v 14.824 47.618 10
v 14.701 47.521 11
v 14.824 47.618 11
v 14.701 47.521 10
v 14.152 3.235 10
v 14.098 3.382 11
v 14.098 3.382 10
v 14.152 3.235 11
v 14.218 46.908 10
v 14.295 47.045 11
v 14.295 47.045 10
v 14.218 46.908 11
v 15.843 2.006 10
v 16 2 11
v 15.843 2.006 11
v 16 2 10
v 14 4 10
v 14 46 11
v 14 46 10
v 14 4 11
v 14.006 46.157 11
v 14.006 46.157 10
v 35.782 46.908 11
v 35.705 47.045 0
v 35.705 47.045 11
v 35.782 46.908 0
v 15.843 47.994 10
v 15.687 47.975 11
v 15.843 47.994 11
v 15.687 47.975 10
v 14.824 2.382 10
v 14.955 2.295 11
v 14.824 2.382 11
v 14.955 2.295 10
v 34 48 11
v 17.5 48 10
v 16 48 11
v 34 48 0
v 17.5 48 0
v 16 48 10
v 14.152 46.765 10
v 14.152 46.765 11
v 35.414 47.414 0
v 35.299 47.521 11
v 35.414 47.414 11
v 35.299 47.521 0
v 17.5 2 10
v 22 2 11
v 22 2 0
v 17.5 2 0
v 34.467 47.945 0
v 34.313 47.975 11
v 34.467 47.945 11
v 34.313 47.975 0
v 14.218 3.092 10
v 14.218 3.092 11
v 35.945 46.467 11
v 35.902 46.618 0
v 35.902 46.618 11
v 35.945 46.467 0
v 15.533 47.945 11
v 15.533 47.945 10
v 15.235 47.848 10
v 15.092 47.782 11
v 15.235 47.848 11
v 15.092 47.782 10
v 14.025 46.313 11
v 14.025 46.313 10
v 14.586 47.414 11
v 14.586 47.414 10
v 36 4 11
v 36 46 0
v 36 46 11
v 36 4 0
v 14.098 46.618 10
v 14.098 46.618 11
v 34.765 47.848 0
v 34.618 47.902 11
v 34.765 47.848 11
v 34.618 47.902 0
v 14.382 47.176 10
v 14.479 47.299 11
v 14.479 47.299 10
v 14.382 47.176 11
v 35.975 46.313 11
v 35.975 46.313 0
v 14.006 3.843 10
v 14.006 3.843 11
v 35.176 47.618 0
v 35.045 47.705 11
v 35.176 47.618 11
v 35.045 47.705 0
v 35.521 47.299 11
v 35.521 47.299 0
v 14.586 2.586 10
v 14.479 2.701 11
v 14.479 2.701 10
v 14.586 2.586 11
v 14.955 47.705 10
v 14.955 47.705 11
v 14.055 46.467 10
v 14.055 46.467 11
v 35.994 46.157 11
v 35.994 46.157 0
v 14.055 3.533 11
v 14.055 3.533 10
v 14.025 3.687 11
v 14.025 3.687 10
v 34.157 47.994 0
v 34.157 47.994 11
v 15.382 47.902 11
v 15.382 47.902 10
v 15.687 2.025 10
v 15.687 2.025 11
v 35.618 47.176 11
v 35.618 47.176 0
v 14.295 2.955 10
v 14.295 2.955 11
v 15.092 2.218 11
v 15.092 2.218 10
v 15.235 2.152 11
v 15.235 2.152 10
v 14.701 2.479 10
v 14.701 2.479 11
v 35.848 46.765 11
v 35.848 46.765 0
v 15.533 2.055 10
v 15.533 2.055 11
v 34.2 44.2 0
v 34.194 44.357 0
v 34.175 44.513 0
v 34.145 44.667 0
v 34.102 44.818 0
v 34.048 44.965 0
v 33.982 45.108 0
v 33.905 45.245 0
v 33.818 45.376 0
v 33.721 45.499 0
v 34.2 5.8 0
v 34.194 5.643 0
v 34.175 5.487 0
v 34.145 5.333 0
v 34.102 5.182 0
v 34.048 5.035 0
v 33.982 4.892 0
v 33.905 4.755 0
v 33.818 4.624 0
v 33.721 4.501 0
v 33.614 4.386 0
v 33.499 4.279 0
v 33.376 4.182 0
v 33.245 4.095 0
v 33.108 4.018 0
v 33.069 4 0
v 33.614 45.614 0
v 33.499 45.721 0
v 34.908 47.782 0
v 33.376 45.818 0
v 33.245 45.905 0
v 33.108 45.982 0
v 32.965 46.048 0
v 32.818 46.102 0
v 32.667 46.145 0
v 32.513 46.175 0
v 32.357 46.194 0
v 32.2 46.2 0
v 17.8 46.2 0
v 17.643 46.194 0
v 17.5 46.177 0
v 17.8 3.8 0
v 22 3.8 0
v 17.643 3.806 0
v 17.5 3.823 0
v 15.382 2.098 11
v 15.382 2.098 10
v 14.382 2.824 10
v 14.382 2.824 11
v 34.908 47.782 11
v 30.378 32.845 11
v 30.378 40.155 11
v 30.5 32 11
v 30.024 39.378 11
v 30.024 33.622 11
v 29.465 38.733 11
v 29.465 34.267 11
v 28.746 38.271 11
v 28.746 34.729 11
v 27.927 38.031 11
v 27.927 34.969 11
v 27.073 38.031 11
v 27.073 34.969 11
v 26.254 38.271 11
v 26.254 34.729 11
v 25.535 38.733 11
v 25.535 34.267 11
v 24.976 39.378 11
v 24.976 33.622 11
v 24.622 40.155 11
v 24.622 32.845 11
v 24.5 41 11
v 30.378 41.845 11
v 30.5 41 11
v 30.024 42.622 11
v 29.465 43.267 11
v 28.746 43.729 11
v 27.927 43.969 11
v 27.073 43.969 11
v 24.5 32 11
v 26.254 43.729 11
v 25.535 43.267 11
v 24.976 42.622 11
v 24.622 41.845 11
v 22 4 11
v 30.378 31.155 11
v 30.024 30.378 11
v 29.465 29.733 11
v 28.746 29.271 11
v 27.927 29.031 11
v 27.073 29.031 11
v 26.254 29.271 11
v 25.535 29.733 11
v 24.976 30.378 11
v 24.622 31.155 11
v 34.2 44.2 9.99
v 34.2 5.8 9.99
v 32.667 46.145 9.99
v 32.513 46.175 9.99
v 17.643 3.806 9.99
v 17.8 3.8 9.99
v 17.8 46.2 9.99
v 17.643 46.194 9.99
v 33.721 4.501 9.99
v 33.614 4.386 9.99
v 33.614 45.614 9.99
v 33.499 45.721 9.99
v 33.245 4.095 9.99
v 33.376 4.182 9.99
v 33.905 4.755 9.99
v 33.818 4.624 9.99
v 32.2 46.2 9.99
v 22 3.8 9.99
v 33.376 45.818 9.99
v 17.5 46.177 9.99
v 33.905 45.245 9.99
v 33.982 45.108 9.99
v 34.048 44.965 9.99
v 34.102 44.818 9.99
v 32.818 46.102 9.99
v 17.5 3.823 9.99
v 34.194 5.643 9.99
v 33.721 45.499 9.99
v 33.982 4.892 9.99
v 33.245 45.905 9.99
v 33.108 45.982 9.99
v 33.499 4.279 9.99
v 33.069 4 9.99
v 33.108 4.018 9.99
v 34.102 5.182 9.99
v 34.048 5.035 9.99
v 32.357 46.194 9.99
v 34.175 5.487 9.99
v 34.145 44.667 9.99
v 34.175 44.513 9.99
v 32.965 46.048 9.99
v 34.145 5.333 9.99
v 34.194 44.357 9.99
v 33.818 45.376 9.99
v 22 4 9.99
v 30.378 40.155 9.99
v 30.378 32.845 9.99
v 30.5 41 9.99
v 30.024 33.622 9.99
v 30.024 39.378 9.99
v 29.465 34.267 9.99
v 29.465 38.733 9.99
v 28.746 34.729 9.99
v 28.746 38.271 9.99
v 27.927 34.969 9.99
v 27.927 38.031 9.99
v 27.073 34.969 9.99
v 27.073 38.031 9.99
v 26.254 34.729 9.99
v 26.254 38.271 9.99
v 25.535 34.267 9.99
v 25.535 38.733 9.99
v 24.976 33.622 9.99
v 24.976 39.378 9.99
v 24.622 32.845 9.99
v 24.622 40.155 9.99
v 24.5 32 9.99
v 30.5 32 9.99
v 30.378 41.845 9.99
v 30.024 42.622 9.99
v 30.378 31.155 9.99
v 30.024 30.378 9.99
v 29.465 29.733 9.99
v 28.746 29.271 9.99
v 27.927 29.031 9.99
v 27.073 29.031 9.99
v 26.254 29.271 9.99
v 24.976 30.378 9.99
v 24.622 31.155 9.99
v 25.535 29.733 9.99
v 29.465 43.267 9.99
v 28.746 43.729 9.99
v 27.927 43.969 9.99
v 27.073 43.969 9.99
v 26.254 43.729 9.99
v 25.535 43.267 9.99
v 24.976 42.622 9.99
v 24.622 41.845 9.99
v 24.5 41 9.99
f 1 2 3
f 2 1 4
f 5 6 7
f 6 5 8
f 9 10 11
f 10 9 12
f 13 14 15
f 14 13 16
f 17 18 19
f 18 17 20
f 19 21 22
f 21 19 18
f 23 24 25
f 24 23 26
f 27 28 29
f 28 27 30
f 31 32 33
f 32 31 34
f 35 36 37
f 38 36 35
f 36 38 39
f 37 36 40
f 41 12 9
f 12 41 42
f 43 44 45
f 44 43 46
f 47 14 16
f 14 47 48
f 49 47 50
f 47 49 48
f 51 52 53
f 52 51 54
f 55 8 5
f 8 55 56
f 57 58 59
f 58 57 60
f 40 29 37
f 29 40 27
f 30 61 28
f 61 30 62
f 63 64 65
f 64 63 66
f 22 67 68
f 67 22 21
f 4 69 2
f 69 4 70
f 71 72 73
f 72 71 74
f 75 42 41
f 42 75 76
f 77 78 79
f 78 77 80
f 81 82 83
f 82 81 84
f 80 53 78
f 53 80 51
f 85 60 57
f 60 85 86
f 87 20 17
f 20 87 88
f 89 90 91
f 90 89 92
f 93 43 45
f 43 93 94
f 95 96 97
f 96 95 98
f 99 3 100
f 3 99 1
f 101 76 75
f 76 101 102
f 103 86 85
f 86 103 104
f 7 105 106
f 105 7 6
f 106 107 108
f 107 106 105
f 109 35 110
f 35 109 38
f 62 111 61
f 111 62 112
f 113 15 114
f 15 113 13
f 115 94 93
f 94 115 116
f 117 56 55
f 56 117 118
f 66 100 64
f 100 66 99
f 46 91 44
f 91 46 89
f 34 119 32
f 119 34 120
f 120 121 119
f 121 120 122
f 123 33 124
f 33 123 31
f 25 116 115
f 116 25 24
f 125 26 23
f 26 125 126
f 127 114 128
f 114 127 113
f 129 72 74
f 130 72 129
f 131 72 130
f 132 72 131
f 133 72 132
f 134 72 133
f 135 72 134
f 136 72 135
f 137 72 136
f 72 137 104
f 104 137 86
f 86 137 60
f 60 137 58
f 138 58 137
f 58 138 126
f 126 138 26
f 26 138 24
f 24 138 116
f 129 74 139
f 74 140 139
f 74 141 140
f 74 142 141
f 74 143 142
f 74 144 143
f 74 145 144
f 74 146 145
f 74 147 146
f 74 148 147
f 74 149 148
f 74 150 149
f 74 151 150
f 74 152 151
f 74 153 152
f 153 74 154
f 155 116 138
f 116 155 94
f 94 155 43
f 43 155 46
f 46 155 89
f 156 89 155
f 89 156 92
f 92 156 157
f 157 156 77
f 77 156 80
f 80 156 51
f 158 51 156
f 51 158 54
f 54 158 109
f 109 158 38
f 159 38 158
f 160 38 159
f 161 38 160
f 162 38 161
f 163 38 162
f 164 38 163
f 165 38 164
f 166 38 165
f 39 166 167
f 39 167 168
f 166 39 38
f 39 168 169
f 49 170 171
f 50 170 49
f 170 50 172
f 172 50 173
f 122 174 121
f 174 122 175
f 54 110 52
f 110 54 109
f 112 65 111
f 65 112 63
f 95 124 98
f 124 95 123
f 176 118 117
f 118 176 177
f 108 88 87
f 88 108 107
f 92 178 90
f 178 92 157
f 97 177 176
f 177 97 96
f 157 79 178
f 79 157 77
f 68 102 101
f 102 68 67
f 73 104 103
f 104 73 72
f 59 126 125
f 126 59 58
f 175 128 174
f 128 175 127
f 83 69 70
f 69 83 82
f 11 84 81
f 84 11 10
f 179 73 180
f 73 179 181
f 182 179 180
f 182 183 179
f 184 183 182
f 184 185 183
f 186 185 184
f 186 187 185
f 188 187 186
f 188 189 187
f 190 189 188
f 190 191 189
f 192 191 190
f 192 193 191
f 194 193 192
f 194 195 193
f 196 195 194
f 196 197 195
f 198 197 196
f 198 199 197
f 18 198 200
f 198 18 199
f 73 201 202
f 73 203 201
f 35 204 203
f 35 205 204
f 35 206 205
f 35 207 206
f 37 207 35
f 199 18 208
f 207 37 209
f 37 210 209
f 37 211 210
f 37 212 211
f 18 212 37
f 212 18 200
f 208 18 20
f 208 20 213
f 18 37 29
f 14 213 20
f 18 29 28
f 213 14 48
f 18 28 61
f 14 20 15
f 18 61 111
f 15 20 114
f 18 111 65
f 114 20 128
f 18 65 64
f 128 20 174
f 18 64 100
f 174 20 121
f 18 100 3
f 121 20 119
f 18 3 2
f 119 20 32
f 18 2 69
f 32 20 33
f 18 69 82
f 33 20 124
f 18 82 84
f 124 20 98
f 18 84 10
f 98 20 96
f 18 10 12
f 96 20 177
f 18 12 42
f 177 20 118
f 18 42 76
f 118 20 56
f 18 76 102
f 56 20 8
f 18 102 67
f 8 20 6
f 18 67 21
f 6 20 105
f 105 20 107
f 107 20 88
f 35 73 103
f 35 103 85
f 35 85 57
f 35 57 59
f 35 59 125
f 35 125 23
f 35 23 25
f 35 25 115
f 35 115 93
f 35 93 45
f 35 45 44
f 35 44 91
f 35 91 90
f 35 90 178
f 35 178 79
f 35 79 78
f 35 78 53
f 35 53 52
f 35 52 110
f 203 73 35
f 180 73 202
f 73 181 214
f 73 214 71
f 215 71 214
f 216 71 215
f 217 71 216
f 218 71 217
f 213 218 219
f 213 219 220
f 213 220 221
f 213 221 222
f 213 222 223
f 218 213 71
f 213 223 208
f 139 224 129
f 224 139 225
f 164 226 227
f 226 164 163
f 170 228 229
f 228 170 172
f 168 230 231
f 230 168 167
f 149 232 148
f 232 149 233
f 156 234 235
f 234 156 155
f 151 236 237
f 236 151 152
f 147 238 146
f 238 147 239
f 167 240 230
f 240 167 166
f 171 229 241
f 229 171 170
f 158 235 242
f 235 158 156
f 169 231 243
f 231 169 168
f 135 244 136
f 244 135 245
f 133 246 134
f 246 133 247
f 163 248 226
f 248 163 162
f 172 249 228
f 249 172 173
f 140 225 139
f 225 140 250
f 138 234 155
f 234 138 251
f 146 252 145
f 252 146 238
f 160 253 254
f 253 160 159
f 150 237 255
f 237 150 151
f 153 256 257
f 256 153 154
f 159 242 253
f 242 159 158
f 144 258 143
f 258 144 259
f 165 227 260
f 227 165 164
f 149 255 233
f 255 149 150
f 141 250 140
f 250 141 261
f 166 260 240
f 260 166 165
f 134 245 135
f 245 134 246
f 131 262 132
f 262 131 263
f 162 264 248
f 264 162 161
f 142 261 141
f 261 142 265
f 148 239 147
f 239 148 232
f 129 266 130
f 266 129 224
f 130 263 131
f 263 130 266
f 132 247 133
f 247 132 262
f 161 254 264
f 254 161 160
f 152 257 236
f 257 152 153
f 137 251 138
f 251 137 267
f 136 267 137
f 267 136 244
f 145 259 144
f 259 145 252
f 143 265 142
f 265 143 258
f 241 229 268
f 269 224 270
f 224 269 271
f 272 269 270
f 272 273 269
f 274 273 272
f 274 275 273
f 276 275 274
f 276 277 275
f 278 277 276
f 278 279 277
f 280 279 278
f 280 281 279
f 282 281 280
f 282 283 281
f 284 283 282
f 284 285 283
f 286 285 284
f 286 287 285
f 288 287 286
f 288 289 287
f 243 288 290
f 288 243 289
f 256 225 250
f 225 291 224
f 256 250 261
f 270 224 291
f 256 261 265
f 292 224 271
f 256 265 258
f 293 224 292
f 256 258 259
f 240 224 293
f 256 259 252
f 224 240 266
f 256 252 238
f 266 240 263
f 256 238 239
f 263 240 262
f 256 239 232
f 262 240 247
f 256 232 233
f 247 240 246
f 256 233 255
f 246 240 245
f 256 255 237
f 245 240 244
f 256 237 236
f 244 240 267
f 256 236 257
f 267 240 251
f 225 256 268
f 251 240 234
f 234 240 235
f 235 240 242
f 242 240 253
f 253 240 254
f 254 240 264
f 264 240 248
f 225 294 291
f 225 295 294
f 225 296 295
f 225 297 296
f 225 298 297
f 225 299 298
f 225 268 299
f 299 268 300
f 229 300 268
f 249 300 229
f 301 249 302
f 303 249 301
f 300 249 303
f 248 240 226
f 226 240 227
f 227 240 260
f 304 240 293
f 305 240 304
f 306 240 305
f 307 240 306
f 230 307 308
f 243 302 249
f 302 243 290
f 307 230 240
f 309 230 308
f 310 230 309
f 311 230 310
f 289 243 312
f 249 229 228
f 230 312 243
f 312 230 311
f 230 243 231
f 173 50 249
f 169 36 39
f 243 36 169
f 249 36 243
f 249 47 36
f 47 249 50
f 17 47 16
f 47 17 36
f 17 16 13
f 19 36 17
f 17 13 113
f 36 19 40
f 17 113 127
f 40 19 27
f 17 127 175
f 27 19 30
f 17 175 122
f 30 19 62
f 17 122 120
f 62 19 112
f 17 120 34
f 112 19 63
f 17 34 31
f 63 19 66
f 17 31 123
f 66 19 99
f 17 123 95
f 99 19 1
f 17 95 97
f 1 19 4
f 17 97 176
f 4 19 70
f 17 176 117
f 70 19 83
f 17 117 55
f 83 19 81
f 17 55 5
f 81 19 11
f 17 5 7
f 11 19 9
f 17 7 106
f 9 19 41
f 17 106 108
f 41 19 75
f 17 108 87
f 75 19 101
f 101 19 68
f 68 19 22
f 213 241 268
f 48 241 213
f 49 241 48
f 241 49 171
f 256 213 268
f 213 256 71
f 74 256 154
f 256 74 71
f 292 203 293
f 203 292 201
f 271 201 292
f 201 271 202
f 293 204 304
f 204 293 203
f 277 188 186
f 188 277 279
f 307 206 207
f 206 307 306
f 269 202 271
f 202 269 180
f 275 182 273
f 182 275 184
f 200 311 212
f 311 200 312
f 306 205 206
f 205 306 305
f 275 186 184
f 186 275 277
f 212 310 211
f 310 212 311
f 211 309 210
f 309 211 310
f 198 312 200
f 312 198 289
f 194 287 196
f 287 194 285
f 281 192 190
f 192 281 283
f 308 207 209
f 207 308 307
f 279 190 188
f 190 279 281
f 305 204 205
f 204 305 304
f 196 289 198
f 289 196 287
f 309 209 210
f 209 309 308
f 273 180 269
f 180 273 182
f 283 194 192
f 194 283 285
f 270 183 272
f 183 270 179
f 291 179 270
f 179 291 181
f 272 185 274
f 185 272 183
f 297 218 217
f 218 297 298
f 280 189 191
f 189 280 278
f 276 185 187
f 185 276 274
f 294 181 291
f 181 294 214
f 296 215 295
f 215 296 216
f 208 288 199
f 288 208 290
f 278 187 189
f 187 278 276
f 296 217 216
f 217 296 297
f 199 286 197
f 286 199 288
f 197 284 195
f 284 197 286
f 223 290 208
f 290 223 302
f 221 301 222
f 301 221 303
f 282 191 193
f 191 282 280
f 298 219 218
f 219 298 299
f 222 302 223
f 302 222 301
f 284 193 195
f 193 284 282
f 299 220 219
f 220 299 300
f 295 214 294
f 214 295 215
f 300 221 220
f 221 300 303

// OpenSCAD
// powerlid

//---------------
module powerlid(){
tol=0.2;
translate([25,25,0]){
difference(){
    color("yellow")
    linear_extrude(height=11)
    offset(r=2,$fn=80)    
    square(size=[18,42],center=true);

    translate([0,0,-0.01])
    color("orange")
    linear_extrude(height=9.4+0.6)
    offset(r=2,$fn=80)    
    square(size=[14+tol*2,38+tol*2],center=true);


    translate([-13.5,-24,-1])
    color("red")
    cube([6,48,11]);

    // plug at bottom
    translate([-3,-25,-1])
    color("blue")
    cube([14,4,13]);

    // vent holes
    translate([2.5,16,-1])
    color("red")
    cylinder(r=3,h=20,$fn=22);
    translate([2.5,7,-1])
    color("pink")
    cylinder(r=3,h=20,$fn=22);

}

}
}
//---------------

powerlid();
